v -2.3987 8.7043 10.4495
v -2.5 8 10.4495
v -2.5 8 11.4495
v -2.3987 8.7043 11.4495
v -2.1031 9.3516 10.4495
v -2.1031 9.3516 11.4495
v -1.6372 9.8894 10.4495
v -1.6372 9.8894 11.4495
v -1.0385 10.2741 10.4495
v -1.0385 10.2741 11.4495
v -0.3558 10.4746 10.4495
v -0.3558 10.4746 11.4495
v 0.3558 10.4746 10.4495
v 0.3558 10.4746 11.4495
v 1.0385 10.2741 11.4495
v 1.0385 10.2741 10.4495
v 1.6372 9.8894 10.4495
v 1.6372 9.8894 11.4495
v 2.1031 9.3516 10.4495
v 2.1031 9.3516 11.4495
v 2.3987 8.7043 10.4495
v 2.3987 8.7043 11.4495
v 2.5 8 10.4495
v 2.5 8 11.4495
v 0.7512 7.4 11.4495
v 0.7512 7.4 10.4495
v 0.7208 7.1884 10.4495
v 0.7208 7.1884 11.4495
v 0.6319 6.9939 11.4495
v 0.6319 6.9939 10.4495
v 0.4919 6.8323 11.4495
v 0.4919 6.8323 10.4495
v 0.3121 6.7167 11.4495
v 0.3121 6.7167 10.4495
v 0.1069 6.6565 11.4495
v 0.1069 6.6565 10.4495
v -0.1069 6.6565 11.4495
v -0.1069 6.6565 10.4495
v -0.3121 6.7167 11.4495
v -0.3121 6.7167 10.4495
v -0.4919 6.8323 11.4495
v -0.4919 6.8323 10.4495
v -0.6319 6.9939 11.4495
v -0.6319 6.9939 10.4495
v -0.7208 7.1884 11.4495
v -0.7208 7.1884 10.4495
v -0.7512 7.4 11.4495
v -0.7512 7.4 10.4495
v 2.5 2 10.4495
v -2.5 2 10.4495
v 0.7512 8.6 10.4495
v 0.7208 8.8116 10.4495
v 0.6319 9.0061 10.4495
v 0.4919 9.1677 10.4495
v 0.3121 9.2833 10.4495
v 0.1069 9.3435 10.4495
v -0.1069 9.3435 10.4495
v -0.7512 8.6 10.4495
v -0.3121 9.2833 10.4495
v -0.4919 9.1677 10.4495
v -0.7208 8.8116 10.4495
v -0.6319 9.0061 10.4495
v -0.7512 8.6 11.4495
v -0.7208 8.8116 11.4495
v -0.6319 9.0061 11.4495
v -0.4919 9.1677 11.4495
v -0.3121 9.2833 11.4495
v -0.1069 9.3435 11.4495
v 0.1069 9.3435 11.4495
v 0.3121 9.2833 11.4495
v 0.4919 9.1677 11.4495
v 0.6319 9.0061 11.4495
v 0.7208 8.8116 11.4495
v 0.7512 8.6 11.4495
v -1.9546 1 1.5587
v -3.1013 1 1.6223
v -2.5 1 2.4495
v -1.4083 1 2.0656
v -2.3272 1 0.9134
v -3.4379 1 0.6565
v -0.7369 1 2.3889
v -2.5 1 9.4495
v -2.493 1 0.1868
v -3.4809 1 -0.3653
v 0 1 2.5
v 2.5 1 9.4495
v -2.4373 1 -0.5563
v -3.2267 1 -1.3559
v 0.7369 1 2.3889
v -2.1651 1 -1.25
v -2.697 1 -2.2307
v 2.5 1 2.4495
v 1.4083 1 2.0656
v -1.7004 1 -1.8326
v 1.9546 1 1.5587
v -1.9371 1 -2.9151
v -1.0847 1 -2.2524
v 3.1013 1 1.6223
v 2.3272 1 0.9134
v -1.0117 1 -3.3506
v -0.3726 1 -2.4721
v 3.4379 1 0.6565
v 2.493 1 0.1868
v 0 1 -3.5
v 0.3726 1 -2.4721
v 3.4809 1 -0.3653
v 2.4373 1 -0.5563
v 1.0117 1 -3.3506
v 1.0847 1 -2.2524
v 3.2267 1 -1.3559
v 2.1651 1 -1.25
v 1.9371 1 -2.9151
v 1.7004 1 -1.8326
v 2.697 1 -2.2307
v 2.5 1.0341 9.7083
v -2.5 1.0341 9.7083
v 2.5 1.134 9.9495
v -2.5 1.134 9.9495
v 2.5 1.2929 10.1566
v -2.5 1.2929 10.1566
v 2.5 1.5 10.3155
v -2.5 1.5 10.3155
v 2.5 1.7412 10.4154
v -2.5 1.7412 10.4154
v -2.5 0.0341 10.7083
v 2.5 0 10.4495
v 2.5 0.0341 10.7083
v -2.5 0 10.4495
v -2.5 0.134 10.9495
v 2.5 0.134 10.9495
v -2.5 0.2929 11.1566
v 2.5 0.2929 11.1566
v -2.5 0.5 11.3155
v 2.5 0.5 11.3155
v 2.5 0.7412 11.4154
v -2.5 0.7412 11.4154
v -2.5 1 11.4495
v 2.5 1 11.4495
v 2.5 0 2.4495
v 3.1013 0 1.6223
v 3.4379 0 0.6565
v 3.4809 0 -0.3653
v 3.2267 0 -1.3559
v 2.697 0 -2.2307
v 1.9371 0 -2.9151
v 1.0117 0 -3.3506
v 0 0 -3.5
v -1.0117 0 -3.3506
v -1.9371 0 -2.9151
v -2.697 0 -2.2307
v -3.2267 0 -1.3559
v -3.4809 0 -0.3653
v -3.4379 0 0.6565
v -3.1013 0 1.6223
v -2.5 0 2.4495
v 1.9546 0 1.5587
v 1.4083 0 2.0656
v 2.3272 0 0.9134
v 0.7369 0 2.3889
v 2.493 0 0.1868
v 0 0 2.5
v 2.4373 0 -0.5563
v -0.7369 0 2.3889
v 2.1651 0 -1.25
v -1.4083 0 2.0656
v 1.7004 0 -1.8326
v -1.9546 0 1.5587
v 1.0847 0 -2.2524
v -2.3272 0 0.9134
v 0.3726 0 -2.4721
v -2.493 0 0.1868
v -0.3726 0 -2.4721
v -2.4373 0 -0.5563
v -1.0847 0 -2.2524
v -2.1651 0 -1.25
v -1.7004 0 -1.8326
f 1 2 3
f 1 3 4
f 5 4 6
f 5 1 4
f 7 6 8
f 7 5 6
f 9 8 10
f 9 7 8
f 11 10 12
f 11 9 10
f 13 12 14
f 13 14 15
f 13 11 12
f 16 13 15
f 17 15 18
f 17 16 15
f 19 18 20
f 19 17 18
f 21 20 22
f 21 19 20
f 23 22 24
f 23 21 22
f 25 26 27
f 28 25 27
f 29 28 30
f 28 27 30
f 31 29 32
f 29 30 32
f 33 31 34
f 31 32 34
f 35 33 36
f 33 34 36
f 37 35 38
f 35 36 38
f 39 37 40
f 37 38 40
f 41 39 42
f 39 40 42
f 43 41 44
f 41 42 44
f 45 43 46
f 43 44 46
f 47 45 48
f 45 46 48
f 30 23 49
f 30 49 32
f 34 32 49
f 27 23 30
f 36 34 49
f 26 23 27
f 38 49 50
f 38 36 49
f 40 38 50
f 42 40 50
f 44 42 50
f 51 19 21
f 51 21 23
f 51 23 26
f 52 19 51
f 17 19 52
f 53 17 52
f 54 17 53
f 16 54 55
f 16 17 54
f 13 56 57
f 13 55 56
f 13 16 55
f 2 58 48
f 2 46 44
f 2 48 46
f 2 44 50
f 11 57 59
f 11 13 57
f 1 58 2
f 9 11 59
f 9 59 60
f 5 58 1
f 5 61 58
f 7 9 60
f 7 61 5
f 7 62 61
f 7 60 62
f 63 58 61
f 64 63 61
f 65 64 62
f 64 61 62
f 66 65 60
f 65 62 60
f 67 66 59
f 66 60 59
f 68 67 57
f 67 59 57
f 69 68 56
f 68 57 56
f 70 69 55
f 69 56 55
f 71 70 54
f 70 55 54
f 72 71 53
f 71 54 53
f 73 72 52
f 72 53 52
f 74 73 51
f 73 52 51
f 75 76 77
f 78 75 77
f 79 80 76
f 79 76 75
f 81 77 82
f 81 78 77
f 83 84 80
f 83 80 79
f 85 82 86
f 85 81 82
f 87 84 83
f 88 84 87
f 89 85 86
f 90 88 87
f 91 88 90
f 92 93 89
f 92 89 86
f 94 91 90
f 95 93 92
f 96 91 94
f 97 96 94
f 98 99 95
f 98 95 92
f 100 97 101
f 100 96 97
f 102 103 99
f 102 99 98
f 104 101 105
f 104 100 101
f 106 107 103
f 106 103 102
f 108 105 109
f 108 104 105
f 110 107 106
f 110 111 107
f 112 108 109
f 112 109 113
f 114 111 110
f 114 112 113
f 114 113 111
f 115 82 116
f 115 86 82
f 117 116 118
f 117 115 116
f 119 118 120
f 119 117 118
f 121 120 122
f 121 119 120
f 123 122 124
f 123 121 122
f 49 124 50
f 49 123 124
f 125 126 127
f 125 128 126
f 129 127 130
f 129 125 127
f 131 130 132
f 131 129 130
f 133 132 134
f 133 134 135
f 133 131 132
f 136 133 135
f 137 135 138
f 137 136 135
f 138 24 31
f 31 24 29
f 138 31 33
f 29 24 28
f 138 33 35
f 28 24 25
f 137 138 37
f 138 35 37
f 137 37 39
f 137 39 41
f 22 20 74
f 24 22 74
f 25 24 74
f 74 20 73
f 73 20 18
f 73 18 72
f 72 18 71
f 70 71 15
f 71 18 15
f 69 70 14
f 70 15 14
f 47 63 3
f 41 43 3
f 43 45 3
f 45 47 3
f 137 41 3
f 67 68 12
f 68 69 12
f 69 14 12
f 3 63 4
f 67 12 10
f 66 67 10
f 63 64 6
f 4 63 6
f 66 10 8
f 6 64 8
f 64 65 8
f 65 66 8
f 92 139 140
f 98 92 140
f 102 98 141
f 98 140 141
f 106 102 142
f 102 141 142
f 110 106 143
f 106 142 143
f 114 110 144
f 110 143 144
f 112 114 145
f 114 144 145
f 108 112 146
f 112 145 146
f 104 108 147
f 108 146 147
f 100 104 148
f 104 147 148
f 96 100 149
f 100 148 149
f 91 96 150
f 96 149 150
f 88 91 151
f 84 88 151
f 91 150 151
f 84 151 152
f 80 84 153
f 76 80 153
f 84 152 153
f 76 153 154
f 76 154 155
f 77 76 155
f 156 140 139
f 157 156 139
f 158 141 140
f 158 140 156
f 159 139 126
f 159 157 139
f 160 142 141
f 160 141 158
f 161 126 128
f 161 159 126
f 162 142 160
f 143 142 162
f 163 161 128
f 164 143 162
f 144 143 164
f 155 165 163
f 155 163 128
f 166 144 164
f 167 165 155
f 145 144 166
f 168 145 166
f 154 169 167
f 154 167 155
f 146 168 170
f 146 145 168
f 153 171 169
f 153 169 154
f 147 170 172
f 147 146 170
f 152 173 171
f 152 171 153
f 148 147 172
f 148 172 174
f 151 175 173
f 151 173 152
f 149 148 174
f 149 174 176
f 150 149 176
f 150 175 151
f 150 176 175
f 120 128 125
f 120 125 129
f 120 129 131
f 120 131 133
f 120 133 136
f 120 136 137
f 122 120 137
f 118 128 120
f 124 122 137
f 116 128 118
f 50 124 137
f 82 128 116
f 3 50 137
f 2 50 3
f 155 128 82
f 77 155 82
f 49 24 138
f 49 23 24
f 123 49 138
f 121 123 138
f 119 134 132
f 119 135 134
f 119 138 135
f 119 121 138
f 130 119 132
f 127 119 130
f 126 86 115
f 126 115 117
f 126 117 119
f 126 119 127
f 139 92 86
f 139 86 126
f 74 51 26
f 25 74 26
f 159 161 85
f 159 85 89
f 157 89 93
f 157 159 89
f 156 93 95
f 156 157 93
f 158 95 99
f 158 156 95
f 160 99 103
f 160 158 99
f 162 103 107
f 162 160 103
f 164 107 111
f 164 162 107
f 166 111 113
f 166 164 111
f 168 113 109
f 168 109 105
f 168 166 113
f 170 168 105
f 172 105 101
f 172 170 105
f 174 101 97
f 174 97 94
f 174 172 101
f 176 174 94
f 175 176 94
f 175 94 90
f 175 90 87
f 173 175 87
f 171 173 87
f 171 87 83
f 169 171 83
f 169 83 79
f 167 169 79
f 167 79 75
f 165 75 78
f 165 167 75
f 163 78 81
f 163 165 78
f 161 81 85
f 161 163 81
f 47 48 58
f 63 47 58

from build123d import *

# Parameters (mm, degrees)
SKETCH_1_R      = 2.5
EXTRUDE_2_DEPTH = 1
EXTRUDE_3_DEPTH = 1
FILLET_1_R      = 1


with BuildPart() as part:
    # Эскиз1 → Бобышка-Вытянуть2 (new body)
    with BuildSketch(Plane(origin=(0, 0, 0), x_dir=(1, 0, 0), z_dir=(0, 1, 0))):
        with BuildLine():
            Line((-2.5, -2.449489743), (-2.5, -10.449489743))
            Line((-2.5, -10.449489743), (2.5, -10.449489743))
            Line((2.5, -10.449489743), (2.5, -2.449489743))
            ThreePointArc((2.5, -2.449489743), (0, 3.5), (-2.5, -2.449489743))
        make_face()
        with Locations(Location((0, 0, 0), (0, 0, 270))):
            Circle(SKETCH_1_R, mode=Mode.SUBTRACT)
    extrude(amount=EXTRUDE_2_DEPTH)

    # Эскиз3 → Бобышка-Вытянуть3 (add)
    with BuildSketch(Plane.XY.offset(10.449489743)):
        with BuildLine():
            Line((2.5, 0), (-2.5, 0))
            Line((-2.5, 0), (-2.5, 8))
            ThreePointArc((-2.5, 8), (0, 10.5), (2.5, 8))
            Line((2.5, 8), (2.5, 0))
        make_face()
        with BuildLine():
            Line((-0.751190727, 7.4), (-0.751190727, 8.6))
            ThreePointArc((-0.751190727, 8.6), (0, 9.351190727), (0.751190727, 8.6))
            Line((0.751190727, 8.6), (0.751190727, 7.4))
            ThreePointArc((0.751190727, 7.4), (0, 6.648809273), (-0.751190727, 7.4))
        make_face(mode=Mode.SUBTRACT)
    extrude(amount=EXTRUDE_3_DEPTH)

    # Скругление1
    fillet_1_edges = [part.edges().sort_by_distance(p)[0] for p in [
        (0, 0, 11.449489743),
        (0, 1, 10.449489743),
    ]]
    fillet(fillet_1_edges, radius=FILLET_1_R)


solid = part.part
